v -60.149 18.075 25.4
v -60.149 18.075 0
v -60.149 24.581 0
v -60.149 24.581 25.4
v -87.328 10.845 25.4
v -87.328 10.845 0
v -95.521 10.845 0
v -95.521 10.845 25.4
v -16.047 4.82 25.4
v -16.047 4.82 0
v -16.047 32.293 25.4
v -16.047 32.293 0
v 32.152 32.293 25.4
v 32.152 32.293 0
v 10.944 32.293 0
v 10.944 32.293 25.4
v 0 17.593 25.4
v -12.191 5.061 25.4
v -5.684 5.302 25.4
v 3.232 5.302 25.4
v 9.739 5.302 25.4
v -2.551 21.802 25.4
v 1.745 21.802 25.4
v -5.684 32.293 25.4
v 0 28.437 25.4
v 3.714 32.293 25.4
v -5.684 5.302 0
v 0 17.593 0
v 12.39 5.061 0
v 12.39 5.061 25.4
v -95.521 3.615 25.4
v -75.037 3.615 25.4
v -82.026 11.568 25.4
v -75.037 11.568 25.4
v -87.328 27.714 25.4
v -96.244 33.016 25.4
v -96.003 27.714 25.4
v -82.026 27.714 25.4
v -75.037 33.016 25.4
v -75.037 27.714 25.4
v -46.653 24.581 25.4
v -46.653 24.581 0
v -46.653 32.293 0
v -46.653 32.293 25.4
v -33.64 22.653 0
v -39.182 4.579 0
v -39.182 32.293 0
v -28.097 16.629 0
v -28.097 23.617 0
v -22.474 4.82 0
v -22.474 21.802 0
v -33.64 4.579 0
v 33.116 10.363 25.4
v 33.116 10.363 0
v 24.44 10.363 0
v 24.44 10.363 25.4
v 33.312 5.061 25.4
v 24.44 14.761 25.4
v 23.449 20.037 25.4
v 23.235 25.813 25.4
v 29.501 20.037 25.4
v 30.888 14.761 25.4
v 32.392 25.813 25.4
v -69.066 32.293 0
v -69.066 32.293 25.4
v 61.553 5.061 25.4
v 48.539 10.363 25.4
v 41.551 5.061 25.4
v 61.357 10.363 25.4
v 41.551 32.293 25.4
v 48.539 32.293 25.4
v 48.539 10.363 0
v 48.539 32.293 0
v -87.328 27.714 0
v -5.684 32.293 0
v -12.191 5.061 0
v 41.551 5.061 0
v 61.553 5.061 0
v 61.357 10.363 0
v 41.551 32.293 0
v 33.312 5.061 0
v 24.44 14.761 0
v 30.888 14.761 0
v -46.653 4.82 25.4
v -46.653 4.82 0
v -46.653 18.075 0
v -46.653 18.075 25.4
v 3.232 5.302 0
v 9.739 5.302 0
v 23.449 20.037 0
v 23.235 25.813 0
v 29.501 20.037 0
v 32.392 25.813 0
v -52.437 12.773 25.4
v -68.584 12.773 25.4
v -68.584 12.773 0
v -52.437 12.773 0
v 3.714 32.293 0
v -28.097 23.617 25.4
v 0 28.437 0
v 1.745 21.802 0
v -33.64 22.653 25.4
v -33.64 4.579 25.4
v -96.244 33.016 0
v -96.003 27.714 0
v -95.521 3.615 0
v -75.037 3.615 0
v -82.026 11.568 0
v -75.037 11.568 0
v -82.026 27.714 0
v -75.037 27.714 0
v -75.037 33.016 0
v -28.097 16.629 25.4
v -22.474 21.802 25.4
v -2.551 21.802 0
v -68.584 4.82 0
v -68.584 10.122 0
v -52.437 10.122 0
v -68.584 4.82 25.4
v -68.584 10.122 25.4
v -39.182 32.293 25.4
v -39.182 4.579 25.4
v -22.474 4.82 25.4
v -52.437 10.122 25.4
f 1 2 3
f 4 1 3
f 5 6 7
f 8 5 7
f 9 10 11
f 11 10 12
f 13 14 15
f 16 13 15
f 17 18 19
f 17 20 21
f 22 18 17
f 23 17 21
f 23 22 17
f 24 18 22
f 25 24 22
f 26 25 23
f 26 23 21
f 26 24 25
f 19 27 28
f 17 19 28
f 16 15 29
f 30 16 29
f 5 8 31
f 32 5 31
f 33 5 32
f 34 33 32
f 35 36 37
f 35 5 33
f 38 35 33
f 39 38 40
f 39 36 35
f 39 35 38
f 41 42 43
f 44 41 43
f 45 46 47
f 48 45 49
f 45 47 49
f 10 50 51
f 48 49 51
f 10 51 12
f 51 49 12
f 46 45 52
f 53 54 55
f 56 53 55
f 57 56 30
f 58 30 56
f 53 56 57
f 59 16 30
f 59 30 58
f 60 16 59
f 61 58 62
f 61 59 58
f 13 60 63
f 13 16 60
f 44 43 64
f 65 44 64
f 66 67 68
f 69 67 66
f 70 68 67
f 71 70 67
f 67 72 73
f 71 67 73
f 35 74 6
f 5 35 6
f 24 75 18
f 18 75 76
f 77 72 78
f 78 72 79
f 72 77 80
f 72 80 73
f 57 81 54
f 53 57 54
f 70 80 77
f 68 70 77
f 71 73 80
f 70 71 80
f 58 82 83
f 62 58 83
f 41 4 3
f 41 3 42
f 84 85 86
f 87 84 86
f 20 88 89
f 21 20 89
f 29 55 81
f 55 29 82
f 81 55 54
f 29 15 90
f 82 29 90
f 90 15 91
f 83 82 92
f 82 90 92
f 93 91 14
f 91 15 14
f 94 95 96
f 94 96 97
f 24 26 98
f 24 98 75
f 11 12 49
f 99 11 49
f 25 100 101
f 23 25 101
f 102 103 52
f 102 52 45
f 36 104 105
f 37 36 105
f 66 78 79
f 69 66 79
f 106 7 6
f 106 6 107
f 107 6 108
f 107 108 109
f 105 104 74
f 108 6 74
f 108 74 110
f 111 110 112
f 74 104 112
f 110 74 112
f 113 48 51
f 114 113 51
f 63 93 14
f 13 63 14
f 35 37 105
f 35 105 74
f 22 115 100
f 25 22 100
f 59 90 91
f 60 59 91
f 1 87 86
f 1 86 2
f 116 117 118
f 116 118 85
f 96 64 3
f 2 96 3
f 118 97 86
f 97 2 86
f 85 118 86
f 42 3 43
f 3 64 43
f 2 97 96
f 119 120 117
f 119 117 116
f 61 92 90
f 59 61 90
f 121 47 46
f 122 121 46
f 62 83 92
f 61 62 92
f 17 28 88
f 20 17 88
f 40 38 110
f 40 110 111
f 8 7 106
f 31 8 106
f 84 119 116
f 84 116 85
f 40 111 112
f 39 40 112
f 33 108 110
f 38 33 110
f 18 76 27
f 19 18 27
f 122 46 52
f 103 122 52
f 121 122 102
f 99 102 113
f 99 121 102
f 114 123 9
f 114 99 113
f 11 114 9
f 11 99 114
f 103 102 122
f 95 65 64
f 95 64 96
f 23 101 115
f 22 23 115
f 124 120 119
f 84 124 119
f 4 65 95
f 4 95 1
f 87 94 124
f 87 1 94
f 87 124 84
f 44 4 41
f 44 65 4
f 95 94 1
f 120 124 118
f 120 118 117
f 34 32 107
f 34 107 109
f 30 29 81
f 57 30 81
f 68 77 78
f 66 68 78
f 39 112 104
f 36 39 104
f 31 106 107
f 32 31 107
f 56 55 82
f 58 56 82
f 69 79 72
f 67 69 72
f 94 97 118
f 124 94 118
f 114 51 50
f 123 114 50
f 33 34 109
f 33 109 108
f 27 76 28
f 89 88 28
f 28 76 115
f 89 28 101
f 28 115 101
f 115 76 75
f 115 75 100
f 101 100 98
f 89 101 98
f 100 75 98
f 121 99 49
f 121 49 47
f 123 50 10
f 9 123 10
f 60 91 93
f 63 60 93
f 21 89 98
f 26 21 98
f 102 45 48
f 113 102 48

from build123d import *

# Parameters (mm, degrees)
F1_DEPTH = 25.4
F3_DEPTH = 25.4


with BuildPart() as f1:
    # F0 (on Top) → F1 (new body)
    with BuildSketch(Plane.XY):
        Polygon((-75.036883, 33.016175), (-96.24435, 33.016175), (-96.003361, 27.714306), (-87.327577, 27.714306), (-87.327577, 10.844729), (-95.521368, 10.844729), (-95.521368, 3.61491), (-75.036883, 3.61491), (-75.036883, 11.567711), (-82.025707, 11.567711), (-82.025707, 27.714306), (-75.036883, 27.714306), align=None)
    extrude(amount=F1_DEPTH)


with BuildPart() as f3:
    # F2 (on Top) → F3 (new body)
    with BuildSketch(Plane.XY):
        Polygon((-46.65326, 32.293193), (-69.065697, 32.293193), (-68.583712, 12.772681), (-52.437115, 12.772681), (-52.437115, 10.121748), (-68.583712, 10.121748), (-68.583712, 4.81988), (-46.65326, 4.81988), (-46.65326, 18.074548), (-60.148925, 18.074548), (-60.148925, 24.581386), (-46.65326, 24.581386), align=None)
        Polygon((-28.096722, 23.617409), (-39.182447, 32.293193), (-39.182447, 4.578886), (-33.639584, 4.578886), (-33.639584, 22.653433), (-28.096722, 16.628584), (-22.473877, 21.801603), (-22.473877, 4.81988), (-16.047023, 4.81988), (-16.047023, 32.293193), align=None)
        Polygon((-5.684284, 32.293193), (-12.19112, 5.060874), (-5.684284, 5.301868), (0, 17.59256), (3.232493, 5.301868), (9.739333, 5.301868), (3.714483, 32.293193), align=None)
        Polygon((1.745208, 21.801603), (-2.551363, 21.801603), (0, 28.43729), align=None, mode=Mode.SUBTRACT)
        Polygon((32.151774, 32.293193), (10.944301, 32.293193), (12.390264, 5.060874), (33.312114, 5.060874), (33.115748, 10.362742), (24.439966, 10.362742), (24.439966, 14.761201), (30.888446, 14.761201), (29.50084, 20.037201), (23.448919, 20.037201), (23.234997, 25.813097), (32.391777, 25.813097), align=None)
        Polygon((48.539363, 32.293193), (41.550539, 32.293193), (41.550539, 5.060874), (61.553039, 5.060874), (61.356673, 10.362742), (48.539363, 10.362742), align=None)
    extrude(amount=F3_DEPTH)


solid = Compound([f1.part, f3.part])
